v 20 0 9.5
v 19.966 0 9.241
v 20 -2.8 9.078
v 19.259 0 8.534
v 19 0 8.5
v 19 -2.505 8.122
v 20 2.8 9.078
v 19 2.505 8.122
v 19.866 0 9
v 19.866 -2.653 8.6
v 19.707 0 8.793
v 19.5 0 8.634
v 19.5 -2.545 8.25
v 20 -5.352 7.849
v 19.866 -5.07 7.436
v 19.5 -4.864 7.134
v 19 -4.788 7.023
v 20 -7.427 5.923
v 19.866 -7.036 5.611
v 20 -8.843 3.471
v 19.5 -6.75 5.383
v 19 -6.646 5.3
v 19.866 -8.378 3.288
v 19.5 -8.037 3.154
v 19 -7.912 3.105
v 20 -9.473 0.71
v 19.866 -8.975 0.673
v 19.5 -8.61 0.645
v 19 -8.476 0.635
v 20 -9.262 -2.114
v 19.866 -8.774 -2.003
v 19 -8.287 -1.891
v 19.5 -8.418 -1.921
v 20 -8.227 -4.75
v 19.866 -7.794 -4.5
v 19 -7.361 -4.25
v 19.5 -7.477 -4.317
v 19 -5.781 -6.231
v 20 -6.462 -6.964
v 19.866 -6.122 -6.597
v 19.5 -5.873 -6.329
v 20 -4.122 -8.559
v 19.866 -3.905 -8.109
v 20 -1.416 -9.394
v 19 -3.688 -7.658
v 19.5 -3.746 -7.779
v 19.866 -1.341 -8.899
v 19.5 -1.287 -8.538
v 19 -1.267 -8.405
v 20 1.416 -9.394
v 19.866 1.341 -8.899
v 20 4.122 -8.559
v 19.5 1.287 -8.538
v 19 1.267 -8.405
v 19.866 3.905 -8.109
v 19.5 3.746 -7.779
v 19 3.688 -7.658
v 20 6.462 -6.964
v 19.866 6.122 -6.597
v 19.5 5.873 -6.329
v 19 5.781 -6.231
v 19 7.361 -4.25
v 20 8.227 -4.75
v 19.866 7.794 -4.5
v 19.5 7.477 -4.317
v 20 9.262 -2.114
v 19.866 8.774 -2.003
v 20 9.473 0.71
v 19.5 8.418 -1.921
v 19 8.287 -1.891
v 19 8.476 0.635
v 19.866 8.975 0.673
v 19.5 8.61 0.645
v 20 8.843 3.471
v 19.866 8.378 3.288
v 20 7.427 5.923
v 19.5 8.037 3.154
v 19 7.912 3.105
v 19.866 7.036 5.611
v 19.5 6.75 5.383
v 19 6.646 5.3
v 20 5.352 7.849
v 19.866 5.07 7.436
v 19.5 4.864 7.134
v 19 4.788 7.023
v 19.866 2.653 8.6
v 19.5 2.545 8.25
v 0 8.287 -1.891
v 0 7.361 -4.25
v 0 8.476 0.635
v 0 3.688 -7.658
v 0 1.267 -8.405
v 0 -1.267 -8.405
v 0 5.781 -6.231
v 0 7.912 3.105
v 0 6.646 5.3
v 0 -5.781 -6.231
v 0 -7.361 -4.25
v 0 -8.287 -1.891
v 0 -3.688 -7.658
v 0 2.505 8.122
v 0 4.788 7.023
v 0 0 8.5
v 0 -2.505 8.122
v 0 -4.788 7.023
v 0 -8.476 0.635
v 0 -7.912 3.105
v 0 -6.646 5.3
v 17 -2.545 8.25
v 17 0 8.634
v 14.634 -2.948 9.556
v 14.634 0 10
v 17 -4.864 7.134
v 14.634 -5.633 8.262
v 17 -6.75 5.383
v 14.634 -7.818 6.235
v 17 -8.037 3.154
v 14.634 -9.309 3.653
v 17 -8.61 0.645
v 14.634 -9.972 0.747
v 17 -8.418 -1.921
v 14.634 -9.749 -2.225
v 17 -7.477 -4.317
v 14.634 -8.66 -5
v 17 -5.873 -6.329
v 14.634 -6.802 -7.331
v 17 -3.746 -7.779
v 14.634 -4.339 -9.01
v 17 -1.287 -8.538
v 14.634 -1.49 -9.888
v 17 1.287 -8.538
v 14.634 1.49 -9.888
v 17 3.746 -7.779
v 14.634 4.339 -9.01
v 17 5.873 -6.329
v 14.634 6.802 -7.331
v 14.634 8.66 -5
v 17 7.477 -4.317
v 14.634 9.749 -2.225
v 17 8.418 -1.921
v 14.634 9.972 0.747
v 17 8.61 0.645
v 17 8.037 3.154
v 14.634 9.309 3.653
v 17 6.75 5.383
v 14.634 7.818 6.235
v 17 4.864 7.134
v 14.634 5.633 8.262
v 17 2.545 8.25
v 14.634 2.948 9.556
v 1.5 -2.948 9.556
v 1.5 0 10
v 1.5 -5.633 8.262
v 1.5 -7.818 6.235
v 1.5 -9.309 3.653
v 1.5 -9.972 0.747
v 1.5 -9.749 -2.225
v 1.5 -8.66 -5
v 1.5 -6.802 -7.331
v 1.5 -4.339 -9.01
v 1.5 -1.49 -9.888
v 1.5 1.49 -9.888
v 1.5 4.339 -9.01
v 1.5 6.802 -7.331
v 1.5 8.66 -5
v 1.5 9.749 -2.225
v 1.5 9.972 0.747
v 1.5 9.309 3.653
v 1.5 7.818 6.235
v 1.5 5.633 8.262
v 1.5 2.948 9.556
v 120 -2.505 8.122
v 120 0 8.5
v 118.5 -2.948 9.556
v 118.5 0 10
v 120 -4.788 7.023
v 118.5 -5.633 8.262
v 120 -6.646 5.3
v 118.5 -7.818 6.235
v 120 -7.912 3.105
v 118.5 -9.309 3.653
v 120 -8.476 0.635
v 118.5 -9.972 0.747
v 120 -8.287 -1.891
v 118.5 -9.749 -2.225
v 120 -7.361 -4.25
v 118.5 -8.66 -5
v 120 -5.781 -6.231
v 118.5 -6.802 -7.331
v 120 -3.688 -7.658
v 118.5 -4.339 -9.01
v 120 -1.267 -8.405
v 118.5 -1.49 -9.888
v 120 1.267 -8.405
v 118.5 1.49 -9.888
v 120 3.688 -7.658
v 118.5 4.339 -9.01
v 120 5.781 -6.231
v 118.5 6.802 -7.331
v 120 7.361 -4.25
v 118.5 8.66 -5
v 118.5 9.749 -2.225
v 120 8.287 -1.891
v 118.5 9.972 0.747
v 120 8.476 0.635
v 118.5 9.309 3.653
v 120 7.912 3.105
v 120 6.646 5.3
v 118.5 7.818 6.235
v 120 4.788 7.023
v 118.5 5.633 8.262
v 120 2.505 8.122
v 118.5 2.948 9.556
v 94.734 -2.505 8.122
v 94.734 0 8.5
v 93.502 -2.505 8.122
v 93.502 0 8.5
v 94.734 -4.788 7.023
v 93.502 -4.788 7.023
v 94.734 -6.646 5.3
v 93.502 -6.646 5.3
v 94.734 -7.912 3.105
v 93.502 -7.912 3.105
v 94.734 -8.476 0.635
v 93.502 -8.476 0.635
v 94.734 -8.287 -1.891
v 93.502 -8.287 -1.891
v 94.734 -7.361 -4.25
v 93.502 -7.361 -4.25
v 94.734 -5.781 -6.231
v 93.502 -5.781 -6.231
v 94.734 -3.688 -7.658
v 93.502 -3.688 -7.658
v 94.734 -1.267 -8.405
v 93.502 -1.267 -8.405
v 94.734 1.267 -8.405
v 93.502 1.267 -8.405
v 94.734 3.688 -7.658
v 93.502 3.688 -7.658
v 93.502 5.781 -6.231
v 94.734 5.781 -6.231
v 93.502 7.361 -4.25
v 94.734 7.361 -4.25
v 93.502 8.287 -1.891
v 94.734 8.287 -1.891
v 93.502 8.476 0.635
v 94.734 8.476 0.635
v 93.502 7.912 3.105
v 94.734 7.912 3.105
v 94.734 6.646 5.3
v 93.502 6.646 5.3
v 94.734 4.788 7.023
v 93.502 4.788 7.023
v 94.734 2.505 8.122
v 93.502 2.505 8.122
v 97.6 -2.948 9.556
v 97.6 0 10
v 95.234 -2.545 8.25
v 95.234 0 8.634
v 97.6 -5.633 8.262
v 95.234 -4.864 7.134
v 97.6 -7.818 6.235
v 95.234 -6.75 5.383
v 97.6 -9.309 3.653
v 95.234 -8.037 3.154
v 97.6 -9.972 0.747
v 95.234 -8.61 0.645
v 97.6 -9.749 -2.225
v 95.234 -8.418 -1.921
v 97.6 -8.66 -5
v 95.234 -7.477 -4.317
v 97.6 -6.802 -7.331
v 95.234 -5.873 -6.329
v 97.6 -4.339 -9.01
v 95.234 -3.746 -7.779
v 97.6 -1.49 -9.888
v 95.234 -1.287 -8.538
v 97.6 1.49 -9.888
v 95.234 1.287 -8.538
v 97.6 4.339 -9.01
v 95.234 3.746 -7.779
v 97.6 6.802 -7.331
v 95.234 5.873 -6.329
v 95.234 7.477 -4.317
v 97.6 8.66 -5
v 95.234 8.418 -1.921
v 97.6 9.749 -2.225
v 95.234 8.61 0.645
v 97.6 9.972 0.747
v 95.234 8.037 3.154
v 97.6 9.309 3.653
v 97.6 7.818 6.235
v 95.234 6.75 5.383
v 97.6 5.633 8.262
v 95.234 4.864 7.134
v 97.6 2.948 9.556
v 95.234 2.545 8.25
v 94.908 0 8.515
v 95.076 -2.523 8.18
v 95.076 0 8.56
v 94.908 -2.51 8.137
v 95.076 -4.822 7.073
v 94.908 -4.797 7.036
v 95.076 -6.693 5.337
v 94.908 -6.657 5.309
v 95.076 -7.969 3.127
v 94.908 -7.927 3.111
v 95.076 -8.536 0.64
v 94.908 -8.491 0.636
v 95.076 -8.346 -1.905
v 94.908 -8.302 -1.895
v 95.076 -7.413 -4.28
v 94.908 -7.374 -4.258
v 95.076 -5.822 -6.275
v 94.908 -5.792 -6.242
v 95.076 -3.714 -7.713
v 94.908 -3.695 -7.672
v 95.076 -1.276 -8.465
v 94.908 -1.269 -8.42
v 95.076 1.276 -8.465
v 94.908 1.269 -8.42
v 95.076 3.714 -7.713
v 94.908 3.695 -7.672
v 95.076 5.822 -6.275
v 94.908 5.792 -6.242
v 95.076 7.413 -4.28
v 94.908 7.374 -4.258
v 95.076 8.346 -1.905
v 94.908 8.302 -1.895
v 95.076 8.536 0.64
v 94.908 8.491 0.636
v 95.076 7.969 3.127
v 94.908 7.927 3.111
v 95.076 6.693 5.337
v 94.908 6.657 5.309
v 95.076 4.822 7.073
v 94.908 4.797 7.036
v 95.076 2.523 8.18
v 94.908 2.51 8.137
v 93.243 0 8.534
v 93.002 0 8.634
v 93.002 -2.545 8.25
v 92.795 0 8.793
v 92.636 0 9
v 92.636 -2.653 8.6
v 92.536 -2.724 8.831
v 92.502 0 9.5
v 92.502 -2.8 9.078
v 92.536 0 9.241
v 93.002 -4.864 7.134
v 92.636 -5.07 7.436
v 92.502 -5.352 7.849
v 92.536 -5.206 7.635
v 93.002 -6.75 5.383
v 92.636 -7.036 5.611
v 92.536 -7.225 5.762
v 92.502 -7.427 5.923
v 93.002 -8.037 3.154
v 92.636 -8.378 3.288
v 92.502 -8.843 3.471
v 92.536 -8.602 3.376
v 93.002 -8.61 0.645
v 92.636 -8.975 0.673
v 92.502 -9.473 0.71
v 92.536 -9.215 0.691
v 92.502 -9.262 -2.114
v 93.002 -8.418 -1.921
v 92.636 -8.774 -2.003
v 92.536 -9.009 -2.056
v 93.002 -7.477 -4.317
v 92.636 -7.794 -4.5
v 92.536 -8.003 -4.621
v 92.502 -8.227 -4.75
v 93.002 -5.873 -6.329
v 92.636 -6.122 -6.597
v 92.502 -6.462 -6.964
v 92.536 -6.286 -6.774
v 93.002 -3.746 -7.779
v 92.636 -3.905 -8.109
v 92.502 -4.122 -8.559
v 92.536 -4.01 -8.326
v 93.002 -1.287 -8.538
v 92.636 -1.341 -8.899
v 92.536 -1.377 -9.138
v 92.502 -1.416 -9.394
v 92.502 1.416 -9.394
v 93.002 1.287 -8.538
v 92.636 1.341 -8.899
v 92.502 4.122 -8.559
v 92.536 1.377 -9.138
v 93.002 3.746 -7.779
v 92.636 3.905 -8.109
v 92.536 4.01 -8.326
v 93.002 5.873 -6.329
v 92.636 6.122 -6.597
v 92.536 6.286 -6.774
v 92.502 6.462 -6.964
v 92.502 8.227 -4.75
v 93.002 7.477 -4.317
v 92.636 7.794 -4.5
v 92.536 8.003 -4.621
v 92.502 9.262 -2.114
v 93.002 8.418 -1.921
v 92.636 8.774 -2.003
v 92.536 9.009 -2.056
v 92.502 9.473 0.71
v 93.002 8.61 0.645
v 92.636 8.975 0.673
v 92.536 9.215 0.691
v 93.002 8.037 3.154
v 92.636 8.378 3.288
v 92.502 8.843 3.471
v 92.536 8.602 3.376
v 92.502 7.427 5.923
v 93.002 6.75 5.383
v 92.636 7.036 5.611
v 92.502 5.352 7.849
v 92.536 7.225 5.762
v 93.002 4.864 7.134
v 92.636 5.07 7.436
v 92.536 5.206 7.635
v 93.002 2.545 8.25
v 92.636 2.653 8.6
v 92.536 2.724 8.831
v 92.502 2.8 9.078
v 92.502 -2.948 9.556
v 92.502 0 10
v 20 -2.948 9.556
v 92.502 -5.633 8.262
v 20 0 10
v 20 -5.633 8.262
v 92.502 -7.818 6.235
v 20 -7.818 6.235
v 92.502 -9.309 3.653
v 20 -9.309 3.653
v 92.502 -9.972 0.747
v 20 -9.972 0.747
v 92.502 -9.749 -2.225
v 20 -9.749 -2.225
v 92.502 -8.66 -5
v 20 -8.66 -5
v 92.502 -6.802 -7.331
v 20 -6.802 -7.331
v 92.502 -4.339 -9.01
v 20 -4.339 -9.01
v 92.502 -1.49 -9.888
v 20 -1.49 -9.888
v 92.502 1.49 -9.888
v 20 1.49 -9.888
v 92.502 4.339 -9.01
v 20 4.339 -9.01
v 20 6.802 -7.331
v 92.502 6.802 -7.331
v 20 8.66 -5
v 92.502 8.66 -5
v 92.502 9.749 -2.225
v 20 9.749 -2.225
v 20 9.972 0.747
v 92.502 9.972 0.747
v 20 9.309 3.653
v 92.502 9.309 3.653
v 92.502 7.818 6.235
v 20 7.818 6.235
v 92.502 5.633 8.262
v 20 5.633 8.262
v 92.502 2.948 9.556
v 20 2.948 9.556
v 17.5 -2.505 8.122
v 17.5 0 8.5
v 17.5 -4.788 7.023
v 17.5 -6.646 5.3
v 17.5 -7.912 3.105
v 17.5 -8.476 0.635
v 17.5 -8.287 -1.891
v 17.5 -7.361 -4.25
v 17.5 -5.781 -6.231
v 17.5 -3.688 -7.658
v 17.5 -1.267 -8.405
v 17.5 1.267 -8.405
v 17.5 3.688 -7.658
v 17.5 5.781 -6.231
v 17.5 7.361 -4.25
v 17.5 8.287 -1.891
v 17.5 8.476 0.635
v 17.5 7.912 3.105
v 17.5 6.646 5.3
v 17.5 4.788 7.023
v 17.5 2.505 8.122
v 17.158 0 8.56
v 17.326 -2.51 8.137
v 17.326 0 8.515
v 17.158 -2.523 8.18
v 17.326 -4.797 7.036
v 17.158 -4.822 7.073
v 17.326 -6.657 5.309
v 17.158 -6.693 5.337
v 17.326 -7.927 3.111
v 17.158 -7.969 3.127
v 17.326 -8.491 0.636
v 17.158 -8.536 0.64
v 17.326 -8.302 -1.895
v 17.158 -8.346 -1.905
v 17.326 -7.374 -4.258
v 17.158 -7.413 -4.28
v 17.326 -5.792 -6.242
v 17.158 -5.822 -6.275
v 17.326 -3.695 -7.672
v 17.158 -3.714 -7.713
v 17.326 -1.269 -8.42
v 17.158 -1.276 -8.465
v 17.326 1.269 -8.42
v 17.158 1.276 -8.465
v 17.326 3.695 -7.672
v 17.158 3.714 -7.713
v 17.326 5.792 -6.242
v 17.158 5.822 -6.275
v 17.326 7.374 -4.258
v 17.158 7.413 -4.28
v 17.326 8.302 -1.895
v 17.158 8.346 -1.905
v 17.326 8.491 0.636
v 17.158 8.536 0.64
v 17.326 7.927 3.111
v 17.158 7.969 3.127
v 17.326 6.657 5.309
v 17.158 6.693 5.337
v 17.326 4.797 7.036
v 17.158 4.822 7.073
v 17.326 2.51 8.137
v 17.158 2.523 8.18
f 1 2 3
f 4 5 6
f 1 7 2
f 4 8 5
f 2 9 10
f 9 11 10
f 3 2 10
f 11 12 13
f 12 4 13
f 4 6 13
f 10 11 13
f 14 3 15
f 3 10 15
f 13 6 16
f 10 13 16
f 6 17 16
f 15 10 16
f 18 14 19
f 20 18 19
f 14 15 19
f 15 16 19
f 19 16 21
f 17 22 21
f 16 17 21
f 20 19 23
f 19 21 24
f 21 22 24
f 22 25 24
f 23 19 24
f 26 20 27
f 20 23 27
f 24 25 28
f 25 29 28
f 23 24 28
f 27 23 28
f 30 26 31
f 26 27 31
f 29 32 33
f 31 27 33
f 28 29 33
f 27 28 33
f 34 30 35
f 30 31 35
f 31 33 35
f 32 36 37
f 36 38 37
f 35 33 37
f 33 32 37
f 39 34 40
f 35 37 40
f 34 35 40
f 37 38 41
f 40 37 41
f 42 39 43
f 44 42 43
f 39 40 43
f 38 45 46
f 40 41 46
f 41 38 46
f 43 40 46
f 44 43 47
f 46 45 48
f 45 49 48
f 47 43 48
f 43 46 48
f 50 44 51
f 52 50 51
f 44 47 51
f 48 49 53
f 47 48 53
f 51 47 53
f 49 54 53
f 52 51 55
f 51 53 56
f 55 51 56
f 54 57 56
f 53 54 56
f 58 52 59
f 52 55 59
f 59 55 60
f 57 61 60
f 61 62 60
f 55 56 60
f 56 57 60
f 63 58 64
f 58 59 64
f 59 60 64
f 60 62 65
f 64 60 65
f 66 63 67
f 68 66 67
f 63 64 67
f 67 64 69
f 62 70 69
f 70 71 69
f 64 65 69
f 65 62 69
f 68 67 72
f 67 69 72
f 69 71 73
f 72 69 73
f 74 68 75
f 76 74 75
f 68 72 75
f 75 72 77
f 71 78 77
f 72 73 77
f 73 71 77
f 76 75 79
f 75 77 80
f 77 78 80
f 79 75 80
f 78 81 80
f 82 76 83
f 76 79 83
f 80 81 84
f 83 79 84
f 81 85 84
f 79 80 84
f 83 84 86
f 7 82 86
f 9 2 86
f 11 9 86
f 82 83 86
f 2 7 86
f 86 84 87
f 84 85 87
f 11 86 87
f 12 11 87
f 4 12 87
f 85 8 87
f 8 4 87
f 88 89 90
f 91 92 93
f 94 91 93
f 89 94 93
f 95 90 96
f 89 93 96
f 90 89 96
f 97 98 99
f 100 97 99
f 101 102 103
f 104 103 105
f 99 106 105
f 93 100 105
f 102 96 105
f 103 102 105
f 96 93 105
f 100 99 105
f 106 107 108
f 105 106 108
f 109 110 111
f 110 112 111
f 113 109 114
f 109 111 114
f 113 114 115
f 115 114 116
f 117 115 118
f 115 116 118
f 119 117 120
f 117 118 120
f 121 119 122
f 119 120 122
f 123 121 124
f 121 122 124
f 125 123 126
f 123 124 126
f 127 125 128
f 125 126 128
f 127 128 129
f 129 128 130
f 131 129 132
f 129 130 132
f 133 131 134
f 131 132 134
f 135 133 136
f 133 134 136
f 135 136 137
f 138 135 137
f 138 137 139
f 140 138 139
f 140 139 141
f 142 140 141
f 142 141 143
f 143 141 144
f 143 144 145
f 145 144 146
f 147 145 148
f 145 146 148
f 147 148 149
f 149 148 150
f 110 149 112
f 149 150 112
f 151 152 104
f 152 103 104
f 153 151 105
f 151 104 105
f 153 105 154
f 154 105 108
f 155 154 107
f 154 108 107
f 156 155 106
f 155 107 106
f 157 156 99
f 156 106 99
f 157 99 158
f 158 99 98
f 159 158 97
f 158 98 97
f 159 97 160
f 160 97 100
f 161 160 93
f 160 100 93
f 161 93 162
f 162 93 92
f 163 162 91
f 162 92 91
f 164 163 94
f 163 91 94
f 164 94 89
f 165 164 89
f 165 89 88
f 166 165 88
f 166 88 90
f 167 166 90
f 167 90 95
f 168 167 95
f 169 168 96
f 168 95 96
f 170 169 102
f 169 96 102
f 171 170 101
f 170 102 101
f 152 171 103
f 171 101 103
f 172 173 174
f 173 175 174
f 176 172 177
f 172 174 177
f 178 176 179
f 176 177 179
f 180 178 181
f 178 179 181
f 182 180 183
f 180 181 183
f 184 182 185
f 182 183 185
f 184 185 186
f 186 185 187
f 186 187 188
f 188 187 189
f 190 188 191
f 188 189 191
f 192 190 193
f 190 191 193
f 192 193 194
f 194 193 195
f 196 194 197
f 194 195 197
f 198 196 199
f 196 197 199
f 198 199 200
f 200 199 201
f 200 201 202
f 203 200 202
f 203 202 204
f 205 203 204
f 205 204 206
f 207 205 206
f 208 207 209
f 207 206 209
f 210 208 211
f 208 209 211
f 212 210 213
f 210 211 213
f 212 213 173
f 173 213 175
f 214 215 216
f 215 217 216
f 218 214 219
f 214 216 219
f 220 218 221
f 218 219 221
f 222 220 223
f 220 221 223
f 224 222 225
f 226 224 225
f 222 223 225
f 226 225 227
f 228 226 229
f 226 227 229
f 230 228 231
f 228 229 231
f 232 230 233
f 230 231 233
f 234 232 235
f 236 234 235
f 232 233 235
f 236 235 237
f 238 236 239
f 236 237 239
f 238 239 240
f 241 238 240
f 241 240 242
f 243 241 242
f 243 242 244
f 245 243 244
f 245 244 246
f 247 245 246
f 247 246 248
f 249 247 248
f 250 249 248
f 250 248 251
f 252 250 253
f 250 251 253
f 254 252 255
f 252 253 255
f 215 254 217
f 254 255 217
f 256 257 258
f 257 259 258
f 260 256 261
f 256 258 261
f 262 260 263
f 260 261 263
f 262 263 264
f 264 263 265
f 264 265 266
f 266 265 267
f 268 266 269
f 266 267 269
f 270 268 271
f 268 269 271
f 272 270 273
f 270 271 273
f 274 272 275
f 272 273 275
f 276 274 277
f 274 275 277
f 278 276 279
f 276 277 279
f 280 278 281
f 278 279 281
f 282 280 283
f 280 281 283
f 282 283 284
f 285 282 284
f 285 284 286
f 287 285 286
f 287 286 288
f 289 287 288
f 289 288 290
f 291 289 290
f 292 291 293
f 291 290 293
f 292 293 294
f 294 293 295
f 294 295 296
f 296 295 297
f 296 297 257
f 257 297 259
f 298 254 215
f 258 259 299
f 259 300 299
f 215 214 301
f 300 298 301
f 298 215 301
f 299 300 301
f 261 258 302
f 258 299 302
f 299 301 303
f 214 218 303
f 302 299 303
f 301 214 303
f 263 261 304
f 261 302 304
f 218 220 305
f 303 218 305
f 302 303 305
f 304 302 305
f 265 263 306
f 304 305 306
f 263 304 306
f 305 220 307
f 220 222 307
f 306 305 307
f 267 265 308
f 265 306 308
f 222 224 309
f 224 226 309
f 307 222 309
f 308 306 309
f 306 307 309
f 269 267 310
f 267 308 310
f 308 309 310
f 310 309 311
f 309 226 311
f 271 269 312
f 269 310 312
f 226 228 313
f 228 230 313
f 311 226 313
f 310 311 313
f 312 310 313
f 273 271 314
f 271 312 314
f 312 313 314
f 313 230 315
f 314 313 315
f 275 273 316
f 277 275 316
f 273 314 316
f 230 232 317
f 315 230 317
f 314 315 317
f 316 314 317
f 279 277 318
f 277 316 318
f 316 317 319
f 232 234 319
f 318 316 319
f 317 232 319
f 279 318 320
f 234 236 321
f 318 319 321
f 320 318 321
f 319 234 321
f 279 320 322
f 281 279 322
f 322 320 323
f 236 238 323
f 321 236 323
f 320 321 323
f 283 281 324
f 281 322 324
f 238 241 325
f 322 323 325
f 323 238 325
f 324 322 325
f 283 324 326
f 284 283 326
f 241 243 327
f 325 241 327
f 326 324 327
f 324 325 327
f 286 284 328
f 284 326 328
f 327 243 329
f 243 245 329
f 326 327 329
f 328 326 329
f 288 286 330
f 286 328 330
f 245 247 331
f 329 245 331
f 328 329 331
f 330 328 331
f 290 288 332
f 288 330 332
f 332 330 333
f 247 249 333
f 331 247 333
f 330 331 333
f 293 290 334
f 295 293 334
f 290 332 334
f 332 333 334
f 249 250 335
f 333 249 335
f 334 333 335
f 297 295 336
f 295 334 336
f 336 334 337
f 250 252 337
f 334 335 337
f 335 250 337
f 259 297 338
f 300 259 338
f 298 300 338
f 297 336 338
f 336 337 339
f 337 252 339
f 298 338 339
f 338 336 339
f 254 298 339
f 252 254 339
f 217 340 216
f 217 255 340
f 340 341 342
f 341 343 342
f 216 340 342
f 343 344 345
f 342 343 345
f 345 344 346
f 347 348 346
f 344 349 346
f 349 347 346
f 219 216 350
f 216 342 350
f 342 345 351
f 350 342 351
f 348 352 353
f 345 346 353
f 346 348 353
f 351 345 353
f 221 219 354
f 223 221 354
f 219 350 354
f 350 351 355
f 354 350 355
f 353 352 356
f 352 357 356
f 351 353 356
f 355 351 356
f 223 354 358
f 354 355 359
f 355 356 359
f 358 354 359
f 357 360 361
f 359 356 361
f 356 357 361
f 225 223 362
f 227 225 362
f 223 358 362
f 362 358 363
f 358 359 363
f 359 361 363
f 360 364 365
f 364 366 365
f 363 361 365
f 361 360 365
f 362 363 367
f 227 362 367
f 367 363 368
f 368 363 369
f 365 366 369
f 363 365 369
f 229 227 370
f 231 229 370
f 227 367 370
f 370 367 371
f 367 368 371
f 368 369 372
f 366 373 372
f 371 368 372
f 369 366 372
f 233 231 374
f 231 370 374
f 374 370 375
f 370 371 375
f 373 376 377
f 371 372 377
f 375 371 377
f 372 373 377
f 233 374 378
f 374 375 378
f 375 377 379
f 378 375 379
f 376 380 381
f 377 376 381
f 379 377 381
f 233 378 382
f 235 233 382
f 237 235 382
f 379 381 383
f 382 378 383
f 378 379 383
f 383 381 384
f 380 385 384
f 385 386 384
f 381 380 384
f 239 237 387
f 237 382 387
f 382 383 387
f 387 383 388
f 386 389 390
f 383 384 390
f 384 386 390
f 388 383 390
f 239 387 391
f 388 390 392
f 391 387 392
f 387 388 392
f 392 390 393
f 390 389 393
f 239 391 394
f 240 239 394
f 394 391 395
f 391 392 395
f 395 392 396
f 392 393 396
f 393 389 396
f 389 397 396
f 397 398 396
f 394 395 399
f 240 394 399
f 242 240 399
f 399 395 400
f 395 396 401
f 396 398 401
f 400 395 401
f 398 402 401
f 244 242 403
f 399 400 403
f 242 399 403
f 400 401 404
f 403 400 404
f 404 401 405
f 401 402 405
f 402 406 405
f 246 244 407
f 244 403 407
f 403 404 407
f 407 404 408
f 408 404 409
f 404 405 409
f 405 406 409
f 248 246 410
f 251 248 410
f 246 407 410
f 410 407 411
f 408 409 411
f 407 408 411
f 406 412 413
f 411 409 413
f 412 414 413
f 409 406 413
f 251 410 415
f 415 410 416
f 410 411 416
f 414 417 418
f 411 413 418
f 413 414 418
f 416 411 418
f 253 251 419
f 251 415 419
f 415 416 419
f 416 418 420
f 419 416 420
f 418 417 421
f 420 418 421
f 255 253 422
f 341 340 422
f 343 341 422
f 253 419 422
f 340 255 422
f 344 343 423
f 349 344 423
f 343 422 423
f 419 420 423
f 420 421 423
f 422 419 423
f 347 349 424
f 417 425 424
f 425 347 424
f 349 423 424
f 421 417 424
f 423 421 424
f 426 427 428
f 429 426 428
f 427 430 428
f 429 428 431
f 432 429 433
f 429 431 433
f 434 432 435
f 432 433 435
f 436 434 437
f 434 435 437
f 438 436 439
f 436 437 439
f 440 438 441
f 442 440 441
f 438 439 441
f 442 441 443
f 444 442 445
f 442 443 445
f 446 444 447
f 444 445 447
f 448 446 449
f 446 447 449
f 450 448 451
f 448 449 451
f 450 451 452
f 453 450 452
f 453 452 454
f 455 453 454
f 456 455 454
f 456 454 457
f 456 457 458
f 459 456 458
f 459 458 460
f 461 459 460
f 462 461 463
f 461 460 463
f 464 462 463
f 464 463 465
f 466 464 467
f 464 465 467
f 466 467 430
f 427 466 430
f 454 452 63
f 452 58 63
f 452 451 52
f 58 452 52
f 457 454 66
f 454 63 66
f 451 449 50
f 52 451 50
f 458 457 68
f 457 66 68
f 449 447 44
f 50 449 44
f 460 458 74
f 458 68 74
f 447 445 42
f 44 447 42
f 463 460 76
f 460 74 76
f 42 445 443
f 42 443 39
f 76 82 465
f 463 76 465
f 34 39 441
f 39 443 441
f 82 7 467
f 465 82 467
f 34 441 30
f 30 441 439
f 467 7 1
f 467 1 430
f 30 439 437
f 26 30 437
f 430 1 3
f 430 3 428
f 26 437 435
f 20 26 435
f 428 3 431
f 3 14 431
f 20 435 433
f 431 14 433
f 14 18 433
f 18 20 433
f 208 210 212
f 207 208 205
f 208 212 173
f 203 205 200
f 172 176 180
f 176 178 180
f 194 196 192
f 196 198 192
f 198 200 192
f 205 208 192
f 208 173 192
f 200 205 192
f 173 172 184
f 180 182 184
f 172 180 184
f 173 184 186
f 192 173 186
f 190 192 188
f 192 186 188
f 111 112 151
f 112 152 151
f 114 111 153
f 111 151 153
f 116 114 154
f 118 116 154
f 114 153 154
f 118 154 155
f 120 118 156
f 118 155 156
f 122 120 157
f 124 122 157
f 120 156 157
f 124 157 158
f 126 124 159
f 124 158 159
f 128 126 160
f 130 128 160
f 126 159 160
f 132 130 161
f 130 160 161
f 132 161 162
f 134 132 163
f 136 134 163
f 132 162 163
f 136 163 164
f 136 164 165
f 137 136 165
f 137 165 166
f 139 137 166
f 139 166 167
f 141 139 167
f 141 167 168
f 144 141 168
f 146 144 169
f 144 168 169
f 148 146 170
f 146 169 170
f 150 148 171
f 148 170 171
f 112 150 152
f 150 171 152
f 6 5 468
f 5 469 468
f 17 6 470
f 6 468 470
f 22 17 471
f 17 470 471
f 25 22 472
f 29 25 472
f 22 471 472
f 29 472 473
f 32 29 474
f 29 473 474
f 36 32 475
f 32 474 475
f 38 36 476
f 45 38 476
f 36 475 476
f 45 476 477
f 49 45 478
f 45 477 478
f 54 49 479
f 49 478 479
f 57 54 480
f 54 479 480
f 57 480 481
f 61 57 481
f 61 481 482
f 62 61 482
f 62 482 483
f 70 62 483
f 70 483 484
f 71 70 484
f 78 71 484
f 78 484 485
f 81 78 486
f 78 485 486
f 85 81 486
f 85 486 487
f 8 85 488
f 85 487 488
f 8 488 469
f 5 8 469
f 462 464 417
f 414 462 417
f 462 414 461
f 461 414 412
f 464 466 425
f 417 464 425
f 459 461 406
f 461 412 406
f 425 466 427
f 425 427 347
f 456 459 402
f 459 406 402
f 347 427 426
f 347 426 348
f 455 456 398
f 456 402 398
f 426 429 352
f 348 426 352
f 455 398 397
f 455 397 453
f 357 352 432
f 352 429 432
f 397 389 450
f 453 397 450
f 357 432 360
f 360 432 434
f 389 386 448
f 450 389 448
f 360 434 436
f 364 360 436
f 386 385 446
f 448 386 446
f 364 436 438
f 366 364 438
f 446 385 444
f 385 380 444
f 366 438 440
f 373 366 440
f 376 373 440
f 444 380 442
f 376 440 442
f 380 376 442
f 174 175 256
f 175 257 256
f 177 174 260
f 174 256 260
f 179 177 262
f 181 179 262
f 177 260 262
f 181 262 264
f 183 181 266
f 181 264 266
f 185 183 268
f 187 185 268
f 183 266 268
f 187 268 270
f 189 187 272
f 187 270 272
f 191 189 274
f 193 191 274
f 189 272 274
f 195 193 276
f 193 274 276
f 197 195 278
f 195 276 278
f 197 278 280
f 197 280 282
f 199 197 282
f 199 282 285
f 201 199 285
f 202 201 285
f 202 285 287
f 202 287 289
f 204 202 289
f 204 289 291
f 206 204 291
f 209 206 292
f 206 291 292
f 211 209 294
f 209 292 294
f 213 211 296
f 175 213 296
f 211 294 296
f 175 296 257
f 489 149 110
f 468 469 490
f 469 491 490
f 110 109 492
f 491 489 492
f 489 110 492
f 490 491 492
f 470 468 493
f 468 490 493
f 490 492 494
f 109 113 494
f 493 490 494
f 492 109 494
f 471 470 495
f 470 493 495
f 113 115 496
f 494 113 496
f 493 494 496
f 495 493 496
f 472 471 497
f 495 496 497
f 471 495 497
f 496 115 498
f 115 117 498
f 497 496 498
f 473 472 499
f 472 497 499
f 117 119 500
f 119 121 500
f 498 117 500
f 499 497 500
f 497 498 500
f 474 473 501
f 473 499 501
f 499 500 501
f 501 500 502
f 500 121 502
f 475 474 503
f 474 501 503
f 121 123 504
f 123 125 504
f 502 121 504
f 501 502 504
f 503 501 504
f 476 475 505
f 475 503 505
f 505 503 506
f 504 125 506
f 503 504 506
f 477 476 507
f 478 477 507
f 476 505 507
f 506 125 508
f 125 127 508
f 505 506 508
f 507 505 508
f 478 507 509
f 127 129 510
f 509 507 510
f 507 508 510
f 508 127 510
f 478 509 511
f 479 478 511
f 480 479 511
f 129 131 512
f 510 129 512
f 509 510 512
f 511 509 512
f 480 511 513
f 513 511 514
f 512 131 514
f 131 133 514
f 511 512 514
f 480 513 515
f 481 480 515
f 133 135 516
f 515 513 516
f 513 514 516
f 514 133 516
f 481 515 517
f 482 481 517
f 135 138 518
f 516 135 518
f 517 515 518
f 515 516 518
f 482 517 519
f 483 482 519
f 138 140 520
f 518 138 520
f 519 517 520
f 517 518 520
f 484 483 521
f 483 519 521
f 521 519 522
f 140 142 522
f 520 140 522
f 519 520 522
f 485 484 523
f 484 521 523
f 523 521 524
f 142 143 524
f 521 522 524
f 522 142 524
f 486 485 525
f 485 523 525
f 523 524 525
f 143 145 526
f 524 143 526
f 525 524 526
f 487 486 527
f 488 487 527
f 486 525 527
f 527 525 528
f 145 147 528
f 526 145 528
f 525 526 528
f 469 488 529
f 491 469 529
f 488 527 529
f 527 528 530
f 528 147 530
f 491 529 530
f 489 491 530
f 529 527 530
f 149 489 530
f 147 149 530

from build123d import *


with BuildPart() as part:
    # BodySke → BaseBody (revolve)
    with BuildSketch(Plane.XY, mode=Mode.PRIVATE) as basebody_sk:
        with BuildLine():
            Line((17, 8.633974596), (14.633974596, 10))
            Line((14.633974596, 10), (1.5, 10))
            Line((1.5, 10), (0, 8.5))
            Line((0, 8.5), (0, 0))
            Line((0, 0), (120, 0))
            Line((120, 0), (120, 8.5))
            Line((120, 8.5), (118.5, 10))
            Line((118.5, 10), (97.6, 10))
            Line((97.6, 10), (95.233974596, 8.633974596))
            ThreePointArc((95.233974596, 8.633974596), (94.992793641, 8.534074174), (94.733974596, 8.5))
            Line((94.733974596, 8.5), (93.501923789, 8.5))
            ThreePointArc((93.501923789, 8.5), (92.794817007, 8.792893219), (92.501923789, 9.5))
            Line((92.501923789, 9.5), (92.501923789, 10))
            Line((92.501923789, 10), (20, 10))
            Line((20, 10), (20, 9.5))
            ThreePointArc((20, 9.5), (19.707106781, 8.792893219), (19, 8.5))
            Line((19, 8.5), (17.5, 8.5))
            ThreePointArc((17.5, 8.5), (17.241180955, 8.534074174), (17, 8.633974596))
        make_face()
    revolve(basebody_sk.sketch.rotate(Axis((-3.175, 0, 0), (1, 0, 0)), 90), axis=Axis((-3.175, 0, 0), (1, 0, 0)))


solid = part.part
